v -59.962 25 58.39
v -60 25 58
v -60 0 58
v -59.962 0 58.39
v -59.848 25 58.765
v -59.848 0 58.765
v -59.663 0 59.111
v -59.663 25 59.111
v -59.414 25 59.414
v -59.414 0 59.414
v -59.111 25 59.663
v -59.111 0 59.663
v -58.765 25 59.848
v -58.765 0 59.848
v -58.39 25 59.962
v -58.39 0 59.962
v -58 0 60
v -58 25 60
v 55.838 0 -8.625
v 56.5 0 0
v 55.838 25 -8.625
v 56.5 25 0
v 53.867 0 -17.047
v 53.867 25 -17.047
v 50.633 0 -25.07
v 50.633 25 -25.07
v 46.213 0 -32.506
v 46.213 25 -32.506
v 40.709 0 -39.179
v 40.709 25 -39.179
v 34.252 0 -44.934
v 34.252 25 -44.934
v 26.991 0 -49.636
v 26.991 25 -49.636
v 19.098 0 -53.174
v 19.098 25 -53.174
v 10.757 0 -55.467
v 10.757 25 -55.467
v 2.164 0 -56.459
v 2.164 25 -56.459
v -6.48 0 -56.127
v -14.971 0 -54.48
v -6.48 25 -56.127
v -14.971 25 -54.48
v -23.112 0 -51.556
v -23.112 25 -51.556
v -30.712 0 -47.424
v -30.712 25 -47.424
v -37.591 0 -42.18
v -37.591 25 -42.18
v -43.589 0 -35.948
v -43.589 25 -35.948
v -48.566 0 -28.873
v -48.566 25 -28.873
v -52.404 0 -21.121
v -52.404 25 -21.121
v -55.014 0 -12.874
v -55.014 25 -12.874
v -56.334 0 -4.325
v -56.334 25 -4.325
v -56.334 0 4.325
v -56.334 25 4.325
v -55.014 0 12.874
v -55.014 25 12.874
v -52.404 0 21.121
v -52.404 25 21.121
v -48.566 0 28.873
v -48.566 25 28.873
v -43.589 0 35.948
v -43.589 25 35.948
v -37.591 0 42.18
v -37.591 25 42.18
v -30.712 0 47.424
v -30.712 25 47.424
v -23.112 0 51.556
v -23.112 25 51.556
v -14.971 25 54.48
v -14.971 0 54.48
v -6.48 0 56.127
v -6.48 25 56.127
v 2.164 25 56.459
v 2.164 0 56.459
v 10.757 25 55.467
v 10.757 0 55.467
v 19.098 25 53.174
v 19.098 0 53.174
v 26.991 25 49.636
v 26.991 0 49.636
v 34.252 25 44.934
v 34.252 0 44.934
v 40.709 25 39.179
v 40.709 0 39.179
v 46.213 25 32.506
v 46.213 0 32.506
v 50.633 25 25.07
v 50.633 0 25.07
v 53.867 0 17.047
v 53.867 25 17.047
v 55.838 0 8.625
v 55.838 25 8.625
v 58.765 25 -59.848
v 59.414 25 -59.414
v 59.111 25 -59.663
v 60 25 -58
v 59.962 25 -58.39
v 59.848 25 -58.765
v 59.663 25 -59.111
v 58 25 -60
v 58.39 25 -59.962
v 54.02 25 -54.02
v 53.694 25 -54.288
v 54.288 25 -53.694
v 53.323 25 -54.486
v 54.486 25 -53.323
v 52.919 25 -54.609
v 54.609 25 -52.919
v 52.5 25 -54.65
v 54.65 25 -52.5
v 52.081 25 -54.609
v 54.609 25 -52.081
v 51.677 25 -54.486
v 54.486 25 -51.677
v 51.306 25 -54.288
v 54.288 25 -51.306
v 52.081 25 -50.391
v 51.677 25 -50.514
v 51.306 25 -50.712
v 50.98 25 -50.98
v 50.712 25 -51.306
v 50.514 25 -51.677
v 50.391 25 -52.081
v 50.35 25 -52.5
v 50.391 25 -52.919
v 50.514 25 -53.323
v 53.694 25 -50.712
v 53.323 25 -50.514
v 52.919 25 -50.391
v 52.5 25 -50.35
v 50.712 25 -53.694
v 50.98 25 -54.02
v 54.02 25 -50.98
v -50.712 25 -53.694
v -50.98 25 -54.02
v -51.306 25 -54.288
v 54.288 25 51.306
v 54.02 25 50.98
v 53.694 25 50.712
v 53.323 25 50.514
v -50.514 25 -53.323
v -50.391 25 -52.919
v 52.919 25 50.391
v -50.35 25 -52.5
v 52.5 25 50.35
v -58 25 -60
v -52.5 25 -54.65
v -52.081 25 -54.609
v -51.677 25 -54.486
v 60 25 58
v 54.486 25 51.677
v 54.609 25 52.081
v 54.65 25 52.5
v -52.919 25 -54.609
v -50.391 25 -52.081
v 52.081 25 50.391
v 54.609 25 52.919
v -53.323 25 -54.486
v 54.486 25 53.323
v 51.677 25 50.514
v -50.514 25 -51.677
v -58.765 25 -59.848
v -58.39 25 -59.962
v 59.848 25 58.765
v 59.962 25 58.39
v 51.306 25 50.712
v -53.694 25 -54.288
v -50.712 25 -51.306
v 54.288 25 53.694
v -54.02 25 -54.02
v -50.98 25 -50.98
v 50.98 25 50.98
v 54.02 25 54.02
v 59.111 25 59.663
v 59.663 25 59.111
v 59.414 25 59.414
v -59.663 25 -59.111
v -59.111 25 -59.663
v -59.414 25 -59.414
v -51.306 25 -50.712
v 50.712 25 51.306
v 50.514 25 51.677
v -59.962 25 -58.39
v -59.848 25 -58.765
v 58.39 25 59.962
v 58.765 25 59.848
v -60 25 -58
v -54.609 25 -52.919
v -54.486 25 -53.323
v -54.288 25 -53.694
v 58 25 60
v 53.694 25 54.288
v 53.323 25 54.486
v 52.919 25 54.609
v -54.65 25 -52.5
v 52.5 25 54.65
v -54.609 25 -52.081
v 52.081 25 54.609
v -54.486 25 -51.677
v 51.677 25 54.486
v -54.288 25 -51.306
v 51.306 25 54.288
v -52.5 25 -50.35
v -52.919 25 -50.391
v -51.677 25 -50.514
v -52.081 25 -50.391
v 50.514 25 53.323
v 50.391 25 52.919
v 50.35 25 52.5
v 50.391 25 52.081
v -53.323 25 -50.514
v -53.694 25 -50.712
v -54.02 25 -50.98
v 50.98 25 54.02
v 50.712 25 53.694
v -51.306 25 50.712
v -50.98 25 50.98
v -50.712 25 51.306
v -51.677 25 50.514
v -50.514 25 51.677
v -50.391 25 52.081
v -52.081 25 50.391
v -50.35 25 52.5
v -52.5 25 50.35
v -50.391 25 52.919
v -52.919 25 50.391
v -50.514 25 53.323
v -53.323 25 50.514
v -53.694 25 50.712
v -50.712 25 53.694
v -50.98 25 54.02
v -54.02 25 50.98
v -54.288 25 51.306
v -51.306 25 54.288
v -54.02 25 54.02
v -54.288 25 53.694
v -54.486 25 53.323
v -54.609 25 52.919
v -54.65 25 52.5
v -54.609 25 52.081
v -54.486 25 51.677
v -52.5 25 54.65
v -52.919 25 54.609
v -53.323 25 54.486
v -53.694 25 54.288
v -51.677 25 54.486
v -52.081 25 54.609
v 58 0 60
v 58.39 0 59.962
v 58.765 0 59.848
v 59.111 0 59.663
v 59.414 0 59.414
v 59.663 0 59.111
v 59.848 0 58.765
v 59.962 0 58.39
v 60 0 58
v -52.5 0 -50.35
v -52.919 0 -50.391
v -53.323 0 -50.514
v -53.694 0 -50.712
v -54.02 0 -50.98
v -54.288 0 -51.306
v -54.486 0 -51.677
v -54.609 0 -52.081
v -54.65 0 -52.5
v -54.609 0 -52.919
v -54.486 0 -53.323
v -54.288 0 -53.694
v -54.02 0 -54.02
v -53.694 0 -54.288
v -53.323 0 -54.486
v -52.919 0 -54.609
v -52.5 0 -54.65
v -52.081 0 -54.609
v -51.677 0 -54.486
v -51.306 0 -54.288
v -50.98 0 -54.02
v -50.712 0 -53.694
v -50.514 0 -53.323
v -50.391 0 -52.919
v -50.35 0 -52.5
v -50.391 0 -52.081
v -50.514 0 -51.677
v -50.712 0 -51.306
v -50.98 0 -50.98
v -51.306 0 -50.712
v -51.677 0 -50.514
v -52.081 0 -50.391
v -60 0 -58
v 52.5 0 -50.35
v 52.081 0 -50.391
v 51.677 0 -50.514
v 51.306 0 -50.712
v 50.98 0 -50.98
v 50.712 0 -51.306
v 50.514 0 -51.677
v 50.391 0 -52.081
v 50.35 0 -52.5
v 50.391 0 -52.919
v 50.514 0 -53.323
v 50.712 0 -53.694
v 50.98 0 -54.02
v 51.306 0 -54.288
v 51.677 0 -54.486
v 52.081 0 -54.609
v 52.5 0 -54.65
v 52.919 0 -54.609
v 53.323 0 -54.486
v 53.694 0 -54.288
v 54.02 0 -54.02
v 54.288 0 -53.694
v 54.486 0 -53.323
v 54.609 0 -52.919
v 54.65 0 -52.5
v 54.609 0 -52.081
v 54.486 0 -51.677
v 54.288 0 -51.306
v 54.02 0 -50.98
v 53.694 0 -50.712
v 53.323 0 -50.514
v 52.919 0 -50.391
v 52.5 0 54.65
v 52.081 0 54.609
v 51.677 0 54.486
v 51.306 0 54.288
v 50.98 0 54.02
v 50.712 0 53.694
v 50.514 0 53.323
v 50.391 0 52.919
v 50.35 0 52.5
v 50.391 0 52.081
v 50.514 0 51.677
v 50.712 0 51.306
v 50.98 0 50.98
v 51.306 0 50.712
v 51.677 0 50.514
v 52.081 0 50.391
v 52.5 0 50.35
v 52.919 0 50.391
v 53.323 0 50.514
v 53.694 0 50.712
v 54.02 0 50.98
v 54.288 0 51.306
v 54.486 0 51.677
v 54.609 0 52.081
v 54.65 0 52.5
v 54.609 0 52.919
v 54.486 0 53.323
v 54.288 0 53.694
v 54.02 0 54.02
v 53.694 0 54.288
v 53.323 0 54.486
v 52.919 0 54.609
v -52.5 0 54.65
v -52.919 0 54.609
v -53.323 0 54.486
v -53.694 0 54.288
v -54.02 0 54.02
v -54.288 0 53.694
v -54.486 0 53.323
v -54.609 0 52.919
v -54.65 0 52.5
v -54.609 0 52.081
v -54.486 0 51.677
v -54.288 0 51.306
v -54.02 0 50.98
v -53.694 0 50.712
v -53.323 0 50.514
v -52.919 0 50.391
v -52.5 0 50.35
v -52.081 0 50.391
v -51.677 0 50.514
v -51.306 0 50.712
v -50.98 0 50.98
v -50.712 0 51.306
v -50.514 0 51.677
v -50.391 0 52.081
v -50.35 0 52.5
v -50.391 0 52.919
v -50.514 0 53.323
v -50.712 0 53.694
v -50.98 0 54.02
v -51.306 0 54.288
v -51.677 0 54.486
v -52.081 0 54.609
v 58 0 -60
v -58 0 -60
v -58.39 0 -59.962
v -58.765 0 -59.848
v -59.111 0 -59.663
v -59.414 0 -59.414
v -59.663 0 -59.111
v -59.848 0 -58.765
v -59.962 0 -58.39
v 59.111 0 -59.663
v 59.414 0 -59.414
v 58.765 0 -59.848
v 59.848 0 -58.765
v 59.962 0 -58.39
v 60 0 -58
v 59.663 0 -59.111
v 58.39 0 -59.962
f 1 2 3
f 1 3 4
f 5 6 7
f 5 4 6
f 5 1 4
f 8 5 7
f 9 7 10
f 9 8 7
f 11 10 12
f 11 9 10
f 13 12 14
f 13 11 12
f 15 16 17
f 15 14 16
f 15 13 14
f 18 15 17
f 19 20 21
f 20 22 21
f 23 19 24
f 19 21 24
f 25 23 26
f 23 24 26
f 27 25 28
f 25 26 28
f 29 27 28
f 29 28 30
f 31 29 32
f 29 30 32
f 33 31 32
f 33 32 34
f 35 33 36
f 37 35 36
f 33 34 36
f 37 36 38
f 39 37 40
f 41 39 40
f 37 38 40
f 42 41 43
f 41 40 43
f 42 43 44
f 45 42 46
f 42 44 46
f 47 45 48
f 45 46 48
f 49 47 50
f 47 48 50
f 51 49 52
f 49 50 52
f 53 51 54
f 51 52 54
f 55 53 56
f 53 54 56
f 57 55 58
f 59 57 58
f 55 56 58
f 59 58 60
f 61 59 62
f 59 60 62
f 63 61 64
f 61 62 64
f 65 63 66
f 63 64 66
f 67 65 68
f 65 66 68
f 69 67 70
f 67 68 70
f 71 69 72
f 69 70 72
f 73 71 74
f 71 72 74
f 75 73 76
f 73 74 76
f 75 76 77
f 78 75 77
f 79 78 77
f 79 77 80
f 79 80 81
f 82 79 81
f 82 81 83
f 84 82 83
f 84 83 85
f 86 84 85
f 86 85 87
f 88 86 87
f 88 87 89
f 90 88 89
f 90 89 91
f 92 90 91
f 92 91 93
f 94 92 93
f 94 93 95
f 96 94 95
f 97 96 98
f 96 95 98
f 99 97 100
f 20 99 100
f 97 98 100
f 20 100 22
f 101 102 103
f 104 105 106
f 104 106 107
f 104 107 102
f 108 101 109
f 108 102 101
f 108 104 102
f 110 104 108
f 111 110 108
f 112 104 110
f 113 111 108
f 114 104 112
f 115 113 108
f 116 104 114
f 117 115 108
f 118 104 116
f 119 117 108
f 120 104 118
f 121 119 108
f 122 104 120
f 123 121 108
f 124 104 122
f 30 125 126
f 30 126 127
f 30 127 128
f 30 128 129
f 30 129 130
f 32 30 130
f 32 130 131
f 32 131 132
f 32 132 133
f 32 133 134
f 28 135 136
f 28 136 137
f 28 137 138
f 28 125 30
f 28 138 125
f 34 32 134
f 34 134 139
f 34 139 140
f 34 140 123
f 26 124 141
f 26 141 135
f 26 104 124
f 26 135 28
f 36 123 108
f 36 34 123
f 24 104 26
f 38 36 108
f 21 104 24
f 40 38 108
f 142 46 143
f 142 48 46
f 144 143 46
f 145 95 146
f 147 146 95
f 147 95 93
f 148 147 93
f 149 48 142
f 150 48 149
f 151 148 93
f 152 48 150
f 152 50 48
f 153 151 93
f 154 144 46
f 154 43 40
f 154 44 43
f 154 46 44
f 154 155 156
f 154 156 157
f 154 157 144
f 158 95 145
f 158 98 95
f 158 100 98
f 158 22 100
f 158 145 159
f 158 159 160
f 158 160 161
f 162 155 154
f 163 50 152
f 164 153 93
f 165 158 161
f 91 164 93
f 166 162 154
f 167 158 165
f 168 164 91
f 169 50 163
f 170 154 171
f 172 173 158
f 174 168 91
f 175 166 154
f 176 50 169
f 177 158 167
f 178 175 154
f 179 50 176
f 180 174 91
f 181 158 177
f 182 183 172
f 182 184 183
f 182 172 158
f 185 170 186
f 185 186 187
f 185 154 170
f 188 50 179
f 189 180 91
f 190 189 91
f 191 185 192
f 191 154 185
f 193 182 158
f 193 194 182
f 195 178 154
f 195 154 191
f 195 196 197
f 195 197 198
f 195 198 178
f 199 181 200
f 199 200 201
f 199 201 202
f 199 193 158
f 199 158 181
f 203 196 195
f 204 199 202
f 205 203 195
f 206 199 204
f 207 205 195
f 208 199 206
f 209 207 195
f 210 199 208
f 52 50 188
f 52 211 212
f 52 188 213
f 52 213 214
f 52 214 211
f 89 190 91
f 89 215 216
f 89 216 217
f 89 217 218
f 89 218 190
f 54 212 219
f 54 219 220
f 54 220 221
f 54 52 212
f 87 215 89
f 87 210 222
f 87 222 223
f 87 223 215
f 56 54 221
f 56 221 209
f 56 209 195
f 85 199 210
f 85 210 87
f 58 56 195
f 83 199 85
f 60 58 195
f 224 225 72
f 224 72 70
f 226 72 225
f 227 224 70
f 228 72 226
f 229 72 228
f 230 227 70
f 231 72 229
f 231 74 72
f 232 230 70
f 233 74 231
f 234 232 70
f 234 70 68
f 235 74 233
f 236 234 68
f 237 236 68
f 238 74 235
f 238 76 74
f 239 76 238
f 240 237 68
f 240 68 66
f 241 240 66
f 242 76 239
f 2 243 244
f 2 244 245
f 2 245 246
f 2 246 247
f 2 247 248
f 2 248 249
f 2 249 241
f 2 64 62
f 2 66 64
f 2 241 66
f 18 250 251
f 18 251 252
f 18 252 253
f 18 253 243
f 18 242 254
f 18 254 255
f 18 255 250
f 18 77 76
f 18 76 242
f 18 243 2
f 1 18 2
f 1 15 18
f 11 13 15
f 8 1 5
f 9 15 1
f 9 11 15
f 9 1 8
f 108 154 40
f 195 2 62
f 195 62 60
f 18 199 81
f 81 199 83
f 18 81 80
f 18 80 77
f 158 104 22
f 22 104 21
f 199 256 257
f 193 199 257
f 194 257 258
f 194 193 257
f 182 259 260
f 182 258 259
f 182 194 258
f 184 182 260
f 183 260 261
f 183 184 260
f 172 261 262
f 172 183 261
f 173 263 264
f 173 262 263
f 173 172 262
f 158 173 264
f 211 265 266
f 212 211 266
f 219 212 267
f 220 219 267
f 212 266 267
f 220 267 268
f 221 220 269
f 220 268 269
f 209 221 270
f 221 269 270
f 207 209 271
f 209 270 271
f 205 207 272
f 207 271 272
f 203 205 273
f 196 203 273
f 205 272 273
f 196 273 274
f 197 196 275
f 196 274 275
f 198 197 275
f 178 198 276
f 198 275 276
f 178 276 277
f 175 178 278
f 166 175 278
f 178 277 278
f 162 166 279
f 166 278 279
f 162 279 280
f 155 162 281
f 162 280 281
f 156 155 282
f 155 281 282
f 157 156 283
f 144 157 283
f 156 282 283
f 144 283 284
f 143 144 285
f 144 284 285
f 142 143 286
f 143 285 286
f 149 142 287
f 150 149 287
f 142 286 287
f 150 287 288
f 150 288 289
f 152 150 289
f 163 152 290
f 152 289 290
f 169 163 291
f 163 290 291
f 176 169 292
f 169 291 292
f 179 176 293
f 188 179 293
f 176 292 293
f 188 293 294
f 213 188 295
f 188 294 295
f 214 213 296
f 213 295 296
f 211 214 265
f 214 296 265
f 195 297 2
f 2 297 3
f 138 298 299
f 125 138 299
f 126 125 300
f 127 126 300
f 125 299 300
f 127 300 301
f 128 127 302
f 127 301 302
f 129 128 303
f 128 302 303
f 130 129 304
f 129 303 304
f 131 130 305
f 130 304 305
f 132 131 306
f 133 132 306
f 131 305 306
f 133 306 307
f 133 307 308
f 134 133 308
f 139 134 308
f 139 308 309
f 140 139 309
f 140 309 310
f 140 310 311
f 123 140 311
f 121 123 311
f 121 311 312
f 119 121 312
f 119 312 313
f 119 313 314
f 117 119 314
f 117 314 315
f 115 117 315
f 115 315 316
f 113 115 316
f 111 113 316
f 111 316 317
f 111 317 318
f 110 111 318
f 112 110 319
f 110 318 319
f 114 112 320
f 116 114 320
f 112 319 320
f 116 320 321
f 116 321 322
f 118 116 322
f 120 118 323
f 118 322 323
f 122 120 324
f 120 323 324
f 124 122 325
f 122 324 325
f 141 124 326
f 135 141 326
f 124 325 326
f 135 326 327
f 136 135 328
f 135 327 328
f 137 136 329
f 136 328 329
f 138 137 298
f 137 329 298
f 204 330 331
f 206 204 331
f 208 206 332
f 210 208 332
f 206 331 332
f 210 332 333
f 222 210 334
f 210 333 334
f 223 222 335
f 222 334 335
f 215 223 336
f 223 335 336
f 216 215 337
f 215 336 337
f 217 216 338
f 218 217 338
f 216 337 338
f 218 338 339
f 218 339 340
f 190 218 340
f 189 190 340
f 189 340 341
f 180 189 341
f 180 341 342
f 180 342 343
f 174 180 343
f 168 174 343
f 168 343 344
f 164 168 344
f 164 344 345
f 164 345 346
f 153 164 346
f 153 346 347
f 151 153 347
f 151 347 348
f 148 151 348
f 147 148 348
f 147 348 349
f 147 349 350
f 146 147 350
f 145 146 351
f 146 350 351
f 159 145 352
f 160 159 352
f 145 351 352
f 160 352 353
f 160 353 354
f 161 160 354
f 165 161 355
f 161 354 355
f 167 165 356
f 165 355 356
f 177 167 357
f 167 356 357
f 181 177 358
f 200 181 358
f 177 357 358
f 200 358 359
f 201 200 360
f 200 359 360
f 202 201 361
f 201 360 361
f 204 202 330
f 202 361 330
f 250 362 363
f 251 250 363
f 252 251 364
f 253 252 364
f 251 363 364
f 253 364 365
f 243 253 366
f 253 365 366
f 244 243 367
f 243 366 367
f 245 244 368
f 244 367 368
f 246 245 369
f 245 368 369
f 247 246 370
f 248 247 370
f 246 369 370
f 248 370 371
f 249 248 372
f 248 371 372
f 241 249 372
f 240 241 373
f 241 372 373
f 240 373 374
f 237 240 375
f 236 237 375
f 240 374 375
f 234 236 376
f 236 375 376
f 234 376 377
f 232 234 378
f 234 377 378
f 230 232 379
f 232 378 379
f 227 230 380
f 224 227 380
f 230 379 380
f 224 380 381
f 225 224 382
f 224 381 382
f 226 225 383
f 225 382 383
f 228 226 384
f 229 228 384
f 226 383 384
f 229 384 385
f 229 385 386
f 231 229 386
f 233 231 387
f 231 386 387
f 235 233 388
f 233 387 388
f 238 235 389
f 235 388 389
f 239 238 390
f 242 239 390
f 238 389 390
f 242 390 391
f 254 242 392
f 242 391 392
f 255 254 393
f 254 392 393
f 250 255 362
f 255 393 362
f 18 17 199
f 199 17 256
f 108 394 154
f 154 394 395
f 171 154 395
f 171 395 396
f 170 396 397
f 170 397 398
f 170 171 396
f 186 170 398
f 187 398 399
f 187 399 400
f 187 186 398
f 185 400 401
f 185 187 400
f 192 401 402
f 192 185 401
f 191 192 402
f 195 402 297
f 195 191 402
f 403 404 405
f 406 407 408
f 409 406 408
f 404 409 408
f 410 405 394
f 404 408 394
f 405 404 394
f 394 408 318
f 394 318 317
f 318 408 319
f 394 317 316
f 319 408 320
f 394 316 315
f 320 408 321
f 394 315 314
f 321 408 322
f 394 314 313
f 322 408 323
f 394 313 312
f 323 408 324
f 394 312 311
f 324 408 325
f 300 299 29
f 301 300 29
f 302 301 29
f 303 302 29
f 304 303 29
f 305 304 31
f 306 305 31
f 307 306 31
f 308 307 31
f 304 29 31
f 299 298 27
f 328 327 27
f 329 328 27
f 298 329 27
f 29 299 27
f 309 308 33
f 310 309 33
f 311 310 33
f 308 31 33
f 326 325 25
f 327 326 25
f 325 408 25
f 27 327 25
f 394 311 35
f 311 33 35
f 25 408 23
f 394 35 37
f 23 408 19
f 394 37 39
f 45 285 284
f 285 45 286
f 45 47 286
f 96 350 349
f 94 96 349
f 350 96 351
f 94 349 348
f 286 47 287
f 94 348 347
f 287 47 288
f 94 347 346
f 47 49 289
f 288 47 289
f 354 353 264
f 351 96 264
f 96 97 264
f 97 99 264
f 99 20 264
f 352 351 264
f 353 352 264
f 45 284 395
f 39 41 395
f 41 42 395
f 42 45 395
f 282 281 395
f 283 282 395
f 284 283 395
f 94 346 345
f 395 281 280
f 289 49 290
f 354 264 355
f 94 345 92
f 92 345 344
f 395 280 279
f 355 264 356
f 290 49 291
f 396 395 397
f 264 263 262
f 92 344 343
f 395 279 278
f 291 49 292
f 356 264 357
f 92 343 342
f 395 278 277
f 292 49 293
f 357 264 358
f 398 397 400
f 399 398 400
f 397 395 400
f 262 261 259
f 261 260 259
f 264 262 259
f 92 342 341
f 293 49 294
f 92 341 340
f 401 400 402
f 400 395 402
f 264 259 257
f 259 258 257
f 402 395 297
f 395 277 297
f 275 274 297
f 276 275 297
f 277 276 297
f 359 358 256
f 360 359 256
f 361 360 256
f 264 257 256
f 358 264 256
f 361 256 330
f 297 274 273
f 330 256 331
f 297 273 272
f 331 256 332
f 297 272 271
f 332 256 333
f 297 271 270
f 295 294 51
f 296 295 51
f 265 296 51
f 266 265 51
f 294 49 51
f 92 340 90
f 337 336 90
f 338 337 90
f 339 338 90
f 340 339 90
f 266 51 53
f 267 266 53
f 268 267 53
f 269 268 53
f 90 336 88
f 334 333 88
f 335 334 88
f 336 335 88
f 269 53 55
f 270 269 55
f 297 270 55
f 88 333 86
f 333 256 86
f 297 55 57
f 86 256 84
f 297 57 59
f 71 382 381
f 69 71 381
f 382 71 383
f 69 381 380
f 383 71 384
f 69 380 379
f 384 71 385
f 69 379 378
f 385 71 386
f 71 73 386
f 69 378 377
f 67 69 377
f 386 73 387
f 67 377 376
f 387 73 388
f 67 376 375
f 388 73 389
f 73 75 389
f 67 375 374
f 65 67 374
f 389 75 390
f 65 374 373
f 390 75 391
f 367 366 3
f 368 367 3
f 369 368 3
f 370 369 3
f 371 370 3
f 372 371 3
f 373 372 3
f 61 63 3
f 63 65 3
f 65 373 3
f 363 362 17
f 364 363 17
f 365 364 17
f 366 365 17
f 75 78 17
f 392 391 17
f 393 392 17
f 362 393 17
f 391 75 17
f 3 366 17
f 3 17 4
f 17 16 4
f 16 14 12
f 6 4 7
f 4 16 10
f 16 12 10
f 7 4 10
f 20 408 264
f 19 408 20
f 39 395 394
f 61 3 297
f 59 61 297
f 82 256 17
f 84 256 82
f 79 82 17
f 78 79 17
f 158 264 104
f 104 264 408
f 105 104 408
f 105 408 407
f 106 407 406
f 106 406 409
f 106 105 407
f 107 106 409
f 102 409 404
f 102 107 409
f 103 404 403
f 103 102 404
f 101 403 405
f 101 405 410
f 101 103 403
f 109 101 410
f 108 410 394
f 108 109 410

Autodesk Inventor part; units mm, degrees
ref_plane "YZ Plane" through (0, 0, 0) normal (1, 0, 0) x (0, 1, 0)
ref_plane "XZ Plane" through (0, 0, 0) normal (0, 1, 0) x (-1, 0, 0)
ref_plane "XY Plane" through (0, 0, 0) normal (0, 0, 1) x (1, 0, 0)
sketch "Skizze1" plane through (0, 0, 0) normal (0, 1, 0) x (-1, 0, 0)
  line L0 (-60, -60) -> (60, -60)
  line L1 (60, -60) -> (60, 60)
  line L2 (60, 60) -> (-60, 60)
  line L3 (-60, 60) -> (-60, -60)
  line L4 (-60, -60) -> (60, 60) construction
  line L5 (60, -60) -> (-60, 60) construction
  point P0 (0, 0)
  dimension "d0" = 120
  dimension "d1" = 120
extrude "Extrusion1" add sketch "Skizze1" along normal blind 25
sketch "Skizze2" plane through (0, 25, 0) normal (0, 1, 0) x (1, 0, 0)
  line L0 (52.5, 52.5) -> (-52.5, 52.5)
  line L1 (-52.5, 52.5) -> (-52.5, -52.5)
  line L2 (-52.5, -52.5) -> (52.5, -52.5)
  line L3 (52.5, -52.5) -> (52.5, 52.5)
  line L4 (52.5, 52.5) -> (-52.5, -52.5) construction
  line L5 (-52.5, 52.5) -> (52.5, -52.5) construction
  point P0 (0, 0)
  dimension "d4" = 105
  dimension "d5" = 105
hole "Bohrung1" at (52.5, 25, 52.5) at (52.5, 25, -52.5) at (-52.5, 25, 52.5) at (-52.5, 25, -52.5) direction (0, -1, 0) diameter 4.3 end through all
sketch "Skizze3" plane through (0, 25, 0) normal (0, 1, 0) x (1, 0, 0)
  circle A0 centre (0, 0) radius 56.5
  dimension "d13" = 113
extrude "Extrusion2" cut sketch "Skizze3" against normal through all
fillet "Rundung1" radius 2 4 edges at (-60, 12.5, 60) (60, 12.5, 60) (-60, 12.5, -60) (60, 12.5, -60)
properties part number "Lüfter80x80"
